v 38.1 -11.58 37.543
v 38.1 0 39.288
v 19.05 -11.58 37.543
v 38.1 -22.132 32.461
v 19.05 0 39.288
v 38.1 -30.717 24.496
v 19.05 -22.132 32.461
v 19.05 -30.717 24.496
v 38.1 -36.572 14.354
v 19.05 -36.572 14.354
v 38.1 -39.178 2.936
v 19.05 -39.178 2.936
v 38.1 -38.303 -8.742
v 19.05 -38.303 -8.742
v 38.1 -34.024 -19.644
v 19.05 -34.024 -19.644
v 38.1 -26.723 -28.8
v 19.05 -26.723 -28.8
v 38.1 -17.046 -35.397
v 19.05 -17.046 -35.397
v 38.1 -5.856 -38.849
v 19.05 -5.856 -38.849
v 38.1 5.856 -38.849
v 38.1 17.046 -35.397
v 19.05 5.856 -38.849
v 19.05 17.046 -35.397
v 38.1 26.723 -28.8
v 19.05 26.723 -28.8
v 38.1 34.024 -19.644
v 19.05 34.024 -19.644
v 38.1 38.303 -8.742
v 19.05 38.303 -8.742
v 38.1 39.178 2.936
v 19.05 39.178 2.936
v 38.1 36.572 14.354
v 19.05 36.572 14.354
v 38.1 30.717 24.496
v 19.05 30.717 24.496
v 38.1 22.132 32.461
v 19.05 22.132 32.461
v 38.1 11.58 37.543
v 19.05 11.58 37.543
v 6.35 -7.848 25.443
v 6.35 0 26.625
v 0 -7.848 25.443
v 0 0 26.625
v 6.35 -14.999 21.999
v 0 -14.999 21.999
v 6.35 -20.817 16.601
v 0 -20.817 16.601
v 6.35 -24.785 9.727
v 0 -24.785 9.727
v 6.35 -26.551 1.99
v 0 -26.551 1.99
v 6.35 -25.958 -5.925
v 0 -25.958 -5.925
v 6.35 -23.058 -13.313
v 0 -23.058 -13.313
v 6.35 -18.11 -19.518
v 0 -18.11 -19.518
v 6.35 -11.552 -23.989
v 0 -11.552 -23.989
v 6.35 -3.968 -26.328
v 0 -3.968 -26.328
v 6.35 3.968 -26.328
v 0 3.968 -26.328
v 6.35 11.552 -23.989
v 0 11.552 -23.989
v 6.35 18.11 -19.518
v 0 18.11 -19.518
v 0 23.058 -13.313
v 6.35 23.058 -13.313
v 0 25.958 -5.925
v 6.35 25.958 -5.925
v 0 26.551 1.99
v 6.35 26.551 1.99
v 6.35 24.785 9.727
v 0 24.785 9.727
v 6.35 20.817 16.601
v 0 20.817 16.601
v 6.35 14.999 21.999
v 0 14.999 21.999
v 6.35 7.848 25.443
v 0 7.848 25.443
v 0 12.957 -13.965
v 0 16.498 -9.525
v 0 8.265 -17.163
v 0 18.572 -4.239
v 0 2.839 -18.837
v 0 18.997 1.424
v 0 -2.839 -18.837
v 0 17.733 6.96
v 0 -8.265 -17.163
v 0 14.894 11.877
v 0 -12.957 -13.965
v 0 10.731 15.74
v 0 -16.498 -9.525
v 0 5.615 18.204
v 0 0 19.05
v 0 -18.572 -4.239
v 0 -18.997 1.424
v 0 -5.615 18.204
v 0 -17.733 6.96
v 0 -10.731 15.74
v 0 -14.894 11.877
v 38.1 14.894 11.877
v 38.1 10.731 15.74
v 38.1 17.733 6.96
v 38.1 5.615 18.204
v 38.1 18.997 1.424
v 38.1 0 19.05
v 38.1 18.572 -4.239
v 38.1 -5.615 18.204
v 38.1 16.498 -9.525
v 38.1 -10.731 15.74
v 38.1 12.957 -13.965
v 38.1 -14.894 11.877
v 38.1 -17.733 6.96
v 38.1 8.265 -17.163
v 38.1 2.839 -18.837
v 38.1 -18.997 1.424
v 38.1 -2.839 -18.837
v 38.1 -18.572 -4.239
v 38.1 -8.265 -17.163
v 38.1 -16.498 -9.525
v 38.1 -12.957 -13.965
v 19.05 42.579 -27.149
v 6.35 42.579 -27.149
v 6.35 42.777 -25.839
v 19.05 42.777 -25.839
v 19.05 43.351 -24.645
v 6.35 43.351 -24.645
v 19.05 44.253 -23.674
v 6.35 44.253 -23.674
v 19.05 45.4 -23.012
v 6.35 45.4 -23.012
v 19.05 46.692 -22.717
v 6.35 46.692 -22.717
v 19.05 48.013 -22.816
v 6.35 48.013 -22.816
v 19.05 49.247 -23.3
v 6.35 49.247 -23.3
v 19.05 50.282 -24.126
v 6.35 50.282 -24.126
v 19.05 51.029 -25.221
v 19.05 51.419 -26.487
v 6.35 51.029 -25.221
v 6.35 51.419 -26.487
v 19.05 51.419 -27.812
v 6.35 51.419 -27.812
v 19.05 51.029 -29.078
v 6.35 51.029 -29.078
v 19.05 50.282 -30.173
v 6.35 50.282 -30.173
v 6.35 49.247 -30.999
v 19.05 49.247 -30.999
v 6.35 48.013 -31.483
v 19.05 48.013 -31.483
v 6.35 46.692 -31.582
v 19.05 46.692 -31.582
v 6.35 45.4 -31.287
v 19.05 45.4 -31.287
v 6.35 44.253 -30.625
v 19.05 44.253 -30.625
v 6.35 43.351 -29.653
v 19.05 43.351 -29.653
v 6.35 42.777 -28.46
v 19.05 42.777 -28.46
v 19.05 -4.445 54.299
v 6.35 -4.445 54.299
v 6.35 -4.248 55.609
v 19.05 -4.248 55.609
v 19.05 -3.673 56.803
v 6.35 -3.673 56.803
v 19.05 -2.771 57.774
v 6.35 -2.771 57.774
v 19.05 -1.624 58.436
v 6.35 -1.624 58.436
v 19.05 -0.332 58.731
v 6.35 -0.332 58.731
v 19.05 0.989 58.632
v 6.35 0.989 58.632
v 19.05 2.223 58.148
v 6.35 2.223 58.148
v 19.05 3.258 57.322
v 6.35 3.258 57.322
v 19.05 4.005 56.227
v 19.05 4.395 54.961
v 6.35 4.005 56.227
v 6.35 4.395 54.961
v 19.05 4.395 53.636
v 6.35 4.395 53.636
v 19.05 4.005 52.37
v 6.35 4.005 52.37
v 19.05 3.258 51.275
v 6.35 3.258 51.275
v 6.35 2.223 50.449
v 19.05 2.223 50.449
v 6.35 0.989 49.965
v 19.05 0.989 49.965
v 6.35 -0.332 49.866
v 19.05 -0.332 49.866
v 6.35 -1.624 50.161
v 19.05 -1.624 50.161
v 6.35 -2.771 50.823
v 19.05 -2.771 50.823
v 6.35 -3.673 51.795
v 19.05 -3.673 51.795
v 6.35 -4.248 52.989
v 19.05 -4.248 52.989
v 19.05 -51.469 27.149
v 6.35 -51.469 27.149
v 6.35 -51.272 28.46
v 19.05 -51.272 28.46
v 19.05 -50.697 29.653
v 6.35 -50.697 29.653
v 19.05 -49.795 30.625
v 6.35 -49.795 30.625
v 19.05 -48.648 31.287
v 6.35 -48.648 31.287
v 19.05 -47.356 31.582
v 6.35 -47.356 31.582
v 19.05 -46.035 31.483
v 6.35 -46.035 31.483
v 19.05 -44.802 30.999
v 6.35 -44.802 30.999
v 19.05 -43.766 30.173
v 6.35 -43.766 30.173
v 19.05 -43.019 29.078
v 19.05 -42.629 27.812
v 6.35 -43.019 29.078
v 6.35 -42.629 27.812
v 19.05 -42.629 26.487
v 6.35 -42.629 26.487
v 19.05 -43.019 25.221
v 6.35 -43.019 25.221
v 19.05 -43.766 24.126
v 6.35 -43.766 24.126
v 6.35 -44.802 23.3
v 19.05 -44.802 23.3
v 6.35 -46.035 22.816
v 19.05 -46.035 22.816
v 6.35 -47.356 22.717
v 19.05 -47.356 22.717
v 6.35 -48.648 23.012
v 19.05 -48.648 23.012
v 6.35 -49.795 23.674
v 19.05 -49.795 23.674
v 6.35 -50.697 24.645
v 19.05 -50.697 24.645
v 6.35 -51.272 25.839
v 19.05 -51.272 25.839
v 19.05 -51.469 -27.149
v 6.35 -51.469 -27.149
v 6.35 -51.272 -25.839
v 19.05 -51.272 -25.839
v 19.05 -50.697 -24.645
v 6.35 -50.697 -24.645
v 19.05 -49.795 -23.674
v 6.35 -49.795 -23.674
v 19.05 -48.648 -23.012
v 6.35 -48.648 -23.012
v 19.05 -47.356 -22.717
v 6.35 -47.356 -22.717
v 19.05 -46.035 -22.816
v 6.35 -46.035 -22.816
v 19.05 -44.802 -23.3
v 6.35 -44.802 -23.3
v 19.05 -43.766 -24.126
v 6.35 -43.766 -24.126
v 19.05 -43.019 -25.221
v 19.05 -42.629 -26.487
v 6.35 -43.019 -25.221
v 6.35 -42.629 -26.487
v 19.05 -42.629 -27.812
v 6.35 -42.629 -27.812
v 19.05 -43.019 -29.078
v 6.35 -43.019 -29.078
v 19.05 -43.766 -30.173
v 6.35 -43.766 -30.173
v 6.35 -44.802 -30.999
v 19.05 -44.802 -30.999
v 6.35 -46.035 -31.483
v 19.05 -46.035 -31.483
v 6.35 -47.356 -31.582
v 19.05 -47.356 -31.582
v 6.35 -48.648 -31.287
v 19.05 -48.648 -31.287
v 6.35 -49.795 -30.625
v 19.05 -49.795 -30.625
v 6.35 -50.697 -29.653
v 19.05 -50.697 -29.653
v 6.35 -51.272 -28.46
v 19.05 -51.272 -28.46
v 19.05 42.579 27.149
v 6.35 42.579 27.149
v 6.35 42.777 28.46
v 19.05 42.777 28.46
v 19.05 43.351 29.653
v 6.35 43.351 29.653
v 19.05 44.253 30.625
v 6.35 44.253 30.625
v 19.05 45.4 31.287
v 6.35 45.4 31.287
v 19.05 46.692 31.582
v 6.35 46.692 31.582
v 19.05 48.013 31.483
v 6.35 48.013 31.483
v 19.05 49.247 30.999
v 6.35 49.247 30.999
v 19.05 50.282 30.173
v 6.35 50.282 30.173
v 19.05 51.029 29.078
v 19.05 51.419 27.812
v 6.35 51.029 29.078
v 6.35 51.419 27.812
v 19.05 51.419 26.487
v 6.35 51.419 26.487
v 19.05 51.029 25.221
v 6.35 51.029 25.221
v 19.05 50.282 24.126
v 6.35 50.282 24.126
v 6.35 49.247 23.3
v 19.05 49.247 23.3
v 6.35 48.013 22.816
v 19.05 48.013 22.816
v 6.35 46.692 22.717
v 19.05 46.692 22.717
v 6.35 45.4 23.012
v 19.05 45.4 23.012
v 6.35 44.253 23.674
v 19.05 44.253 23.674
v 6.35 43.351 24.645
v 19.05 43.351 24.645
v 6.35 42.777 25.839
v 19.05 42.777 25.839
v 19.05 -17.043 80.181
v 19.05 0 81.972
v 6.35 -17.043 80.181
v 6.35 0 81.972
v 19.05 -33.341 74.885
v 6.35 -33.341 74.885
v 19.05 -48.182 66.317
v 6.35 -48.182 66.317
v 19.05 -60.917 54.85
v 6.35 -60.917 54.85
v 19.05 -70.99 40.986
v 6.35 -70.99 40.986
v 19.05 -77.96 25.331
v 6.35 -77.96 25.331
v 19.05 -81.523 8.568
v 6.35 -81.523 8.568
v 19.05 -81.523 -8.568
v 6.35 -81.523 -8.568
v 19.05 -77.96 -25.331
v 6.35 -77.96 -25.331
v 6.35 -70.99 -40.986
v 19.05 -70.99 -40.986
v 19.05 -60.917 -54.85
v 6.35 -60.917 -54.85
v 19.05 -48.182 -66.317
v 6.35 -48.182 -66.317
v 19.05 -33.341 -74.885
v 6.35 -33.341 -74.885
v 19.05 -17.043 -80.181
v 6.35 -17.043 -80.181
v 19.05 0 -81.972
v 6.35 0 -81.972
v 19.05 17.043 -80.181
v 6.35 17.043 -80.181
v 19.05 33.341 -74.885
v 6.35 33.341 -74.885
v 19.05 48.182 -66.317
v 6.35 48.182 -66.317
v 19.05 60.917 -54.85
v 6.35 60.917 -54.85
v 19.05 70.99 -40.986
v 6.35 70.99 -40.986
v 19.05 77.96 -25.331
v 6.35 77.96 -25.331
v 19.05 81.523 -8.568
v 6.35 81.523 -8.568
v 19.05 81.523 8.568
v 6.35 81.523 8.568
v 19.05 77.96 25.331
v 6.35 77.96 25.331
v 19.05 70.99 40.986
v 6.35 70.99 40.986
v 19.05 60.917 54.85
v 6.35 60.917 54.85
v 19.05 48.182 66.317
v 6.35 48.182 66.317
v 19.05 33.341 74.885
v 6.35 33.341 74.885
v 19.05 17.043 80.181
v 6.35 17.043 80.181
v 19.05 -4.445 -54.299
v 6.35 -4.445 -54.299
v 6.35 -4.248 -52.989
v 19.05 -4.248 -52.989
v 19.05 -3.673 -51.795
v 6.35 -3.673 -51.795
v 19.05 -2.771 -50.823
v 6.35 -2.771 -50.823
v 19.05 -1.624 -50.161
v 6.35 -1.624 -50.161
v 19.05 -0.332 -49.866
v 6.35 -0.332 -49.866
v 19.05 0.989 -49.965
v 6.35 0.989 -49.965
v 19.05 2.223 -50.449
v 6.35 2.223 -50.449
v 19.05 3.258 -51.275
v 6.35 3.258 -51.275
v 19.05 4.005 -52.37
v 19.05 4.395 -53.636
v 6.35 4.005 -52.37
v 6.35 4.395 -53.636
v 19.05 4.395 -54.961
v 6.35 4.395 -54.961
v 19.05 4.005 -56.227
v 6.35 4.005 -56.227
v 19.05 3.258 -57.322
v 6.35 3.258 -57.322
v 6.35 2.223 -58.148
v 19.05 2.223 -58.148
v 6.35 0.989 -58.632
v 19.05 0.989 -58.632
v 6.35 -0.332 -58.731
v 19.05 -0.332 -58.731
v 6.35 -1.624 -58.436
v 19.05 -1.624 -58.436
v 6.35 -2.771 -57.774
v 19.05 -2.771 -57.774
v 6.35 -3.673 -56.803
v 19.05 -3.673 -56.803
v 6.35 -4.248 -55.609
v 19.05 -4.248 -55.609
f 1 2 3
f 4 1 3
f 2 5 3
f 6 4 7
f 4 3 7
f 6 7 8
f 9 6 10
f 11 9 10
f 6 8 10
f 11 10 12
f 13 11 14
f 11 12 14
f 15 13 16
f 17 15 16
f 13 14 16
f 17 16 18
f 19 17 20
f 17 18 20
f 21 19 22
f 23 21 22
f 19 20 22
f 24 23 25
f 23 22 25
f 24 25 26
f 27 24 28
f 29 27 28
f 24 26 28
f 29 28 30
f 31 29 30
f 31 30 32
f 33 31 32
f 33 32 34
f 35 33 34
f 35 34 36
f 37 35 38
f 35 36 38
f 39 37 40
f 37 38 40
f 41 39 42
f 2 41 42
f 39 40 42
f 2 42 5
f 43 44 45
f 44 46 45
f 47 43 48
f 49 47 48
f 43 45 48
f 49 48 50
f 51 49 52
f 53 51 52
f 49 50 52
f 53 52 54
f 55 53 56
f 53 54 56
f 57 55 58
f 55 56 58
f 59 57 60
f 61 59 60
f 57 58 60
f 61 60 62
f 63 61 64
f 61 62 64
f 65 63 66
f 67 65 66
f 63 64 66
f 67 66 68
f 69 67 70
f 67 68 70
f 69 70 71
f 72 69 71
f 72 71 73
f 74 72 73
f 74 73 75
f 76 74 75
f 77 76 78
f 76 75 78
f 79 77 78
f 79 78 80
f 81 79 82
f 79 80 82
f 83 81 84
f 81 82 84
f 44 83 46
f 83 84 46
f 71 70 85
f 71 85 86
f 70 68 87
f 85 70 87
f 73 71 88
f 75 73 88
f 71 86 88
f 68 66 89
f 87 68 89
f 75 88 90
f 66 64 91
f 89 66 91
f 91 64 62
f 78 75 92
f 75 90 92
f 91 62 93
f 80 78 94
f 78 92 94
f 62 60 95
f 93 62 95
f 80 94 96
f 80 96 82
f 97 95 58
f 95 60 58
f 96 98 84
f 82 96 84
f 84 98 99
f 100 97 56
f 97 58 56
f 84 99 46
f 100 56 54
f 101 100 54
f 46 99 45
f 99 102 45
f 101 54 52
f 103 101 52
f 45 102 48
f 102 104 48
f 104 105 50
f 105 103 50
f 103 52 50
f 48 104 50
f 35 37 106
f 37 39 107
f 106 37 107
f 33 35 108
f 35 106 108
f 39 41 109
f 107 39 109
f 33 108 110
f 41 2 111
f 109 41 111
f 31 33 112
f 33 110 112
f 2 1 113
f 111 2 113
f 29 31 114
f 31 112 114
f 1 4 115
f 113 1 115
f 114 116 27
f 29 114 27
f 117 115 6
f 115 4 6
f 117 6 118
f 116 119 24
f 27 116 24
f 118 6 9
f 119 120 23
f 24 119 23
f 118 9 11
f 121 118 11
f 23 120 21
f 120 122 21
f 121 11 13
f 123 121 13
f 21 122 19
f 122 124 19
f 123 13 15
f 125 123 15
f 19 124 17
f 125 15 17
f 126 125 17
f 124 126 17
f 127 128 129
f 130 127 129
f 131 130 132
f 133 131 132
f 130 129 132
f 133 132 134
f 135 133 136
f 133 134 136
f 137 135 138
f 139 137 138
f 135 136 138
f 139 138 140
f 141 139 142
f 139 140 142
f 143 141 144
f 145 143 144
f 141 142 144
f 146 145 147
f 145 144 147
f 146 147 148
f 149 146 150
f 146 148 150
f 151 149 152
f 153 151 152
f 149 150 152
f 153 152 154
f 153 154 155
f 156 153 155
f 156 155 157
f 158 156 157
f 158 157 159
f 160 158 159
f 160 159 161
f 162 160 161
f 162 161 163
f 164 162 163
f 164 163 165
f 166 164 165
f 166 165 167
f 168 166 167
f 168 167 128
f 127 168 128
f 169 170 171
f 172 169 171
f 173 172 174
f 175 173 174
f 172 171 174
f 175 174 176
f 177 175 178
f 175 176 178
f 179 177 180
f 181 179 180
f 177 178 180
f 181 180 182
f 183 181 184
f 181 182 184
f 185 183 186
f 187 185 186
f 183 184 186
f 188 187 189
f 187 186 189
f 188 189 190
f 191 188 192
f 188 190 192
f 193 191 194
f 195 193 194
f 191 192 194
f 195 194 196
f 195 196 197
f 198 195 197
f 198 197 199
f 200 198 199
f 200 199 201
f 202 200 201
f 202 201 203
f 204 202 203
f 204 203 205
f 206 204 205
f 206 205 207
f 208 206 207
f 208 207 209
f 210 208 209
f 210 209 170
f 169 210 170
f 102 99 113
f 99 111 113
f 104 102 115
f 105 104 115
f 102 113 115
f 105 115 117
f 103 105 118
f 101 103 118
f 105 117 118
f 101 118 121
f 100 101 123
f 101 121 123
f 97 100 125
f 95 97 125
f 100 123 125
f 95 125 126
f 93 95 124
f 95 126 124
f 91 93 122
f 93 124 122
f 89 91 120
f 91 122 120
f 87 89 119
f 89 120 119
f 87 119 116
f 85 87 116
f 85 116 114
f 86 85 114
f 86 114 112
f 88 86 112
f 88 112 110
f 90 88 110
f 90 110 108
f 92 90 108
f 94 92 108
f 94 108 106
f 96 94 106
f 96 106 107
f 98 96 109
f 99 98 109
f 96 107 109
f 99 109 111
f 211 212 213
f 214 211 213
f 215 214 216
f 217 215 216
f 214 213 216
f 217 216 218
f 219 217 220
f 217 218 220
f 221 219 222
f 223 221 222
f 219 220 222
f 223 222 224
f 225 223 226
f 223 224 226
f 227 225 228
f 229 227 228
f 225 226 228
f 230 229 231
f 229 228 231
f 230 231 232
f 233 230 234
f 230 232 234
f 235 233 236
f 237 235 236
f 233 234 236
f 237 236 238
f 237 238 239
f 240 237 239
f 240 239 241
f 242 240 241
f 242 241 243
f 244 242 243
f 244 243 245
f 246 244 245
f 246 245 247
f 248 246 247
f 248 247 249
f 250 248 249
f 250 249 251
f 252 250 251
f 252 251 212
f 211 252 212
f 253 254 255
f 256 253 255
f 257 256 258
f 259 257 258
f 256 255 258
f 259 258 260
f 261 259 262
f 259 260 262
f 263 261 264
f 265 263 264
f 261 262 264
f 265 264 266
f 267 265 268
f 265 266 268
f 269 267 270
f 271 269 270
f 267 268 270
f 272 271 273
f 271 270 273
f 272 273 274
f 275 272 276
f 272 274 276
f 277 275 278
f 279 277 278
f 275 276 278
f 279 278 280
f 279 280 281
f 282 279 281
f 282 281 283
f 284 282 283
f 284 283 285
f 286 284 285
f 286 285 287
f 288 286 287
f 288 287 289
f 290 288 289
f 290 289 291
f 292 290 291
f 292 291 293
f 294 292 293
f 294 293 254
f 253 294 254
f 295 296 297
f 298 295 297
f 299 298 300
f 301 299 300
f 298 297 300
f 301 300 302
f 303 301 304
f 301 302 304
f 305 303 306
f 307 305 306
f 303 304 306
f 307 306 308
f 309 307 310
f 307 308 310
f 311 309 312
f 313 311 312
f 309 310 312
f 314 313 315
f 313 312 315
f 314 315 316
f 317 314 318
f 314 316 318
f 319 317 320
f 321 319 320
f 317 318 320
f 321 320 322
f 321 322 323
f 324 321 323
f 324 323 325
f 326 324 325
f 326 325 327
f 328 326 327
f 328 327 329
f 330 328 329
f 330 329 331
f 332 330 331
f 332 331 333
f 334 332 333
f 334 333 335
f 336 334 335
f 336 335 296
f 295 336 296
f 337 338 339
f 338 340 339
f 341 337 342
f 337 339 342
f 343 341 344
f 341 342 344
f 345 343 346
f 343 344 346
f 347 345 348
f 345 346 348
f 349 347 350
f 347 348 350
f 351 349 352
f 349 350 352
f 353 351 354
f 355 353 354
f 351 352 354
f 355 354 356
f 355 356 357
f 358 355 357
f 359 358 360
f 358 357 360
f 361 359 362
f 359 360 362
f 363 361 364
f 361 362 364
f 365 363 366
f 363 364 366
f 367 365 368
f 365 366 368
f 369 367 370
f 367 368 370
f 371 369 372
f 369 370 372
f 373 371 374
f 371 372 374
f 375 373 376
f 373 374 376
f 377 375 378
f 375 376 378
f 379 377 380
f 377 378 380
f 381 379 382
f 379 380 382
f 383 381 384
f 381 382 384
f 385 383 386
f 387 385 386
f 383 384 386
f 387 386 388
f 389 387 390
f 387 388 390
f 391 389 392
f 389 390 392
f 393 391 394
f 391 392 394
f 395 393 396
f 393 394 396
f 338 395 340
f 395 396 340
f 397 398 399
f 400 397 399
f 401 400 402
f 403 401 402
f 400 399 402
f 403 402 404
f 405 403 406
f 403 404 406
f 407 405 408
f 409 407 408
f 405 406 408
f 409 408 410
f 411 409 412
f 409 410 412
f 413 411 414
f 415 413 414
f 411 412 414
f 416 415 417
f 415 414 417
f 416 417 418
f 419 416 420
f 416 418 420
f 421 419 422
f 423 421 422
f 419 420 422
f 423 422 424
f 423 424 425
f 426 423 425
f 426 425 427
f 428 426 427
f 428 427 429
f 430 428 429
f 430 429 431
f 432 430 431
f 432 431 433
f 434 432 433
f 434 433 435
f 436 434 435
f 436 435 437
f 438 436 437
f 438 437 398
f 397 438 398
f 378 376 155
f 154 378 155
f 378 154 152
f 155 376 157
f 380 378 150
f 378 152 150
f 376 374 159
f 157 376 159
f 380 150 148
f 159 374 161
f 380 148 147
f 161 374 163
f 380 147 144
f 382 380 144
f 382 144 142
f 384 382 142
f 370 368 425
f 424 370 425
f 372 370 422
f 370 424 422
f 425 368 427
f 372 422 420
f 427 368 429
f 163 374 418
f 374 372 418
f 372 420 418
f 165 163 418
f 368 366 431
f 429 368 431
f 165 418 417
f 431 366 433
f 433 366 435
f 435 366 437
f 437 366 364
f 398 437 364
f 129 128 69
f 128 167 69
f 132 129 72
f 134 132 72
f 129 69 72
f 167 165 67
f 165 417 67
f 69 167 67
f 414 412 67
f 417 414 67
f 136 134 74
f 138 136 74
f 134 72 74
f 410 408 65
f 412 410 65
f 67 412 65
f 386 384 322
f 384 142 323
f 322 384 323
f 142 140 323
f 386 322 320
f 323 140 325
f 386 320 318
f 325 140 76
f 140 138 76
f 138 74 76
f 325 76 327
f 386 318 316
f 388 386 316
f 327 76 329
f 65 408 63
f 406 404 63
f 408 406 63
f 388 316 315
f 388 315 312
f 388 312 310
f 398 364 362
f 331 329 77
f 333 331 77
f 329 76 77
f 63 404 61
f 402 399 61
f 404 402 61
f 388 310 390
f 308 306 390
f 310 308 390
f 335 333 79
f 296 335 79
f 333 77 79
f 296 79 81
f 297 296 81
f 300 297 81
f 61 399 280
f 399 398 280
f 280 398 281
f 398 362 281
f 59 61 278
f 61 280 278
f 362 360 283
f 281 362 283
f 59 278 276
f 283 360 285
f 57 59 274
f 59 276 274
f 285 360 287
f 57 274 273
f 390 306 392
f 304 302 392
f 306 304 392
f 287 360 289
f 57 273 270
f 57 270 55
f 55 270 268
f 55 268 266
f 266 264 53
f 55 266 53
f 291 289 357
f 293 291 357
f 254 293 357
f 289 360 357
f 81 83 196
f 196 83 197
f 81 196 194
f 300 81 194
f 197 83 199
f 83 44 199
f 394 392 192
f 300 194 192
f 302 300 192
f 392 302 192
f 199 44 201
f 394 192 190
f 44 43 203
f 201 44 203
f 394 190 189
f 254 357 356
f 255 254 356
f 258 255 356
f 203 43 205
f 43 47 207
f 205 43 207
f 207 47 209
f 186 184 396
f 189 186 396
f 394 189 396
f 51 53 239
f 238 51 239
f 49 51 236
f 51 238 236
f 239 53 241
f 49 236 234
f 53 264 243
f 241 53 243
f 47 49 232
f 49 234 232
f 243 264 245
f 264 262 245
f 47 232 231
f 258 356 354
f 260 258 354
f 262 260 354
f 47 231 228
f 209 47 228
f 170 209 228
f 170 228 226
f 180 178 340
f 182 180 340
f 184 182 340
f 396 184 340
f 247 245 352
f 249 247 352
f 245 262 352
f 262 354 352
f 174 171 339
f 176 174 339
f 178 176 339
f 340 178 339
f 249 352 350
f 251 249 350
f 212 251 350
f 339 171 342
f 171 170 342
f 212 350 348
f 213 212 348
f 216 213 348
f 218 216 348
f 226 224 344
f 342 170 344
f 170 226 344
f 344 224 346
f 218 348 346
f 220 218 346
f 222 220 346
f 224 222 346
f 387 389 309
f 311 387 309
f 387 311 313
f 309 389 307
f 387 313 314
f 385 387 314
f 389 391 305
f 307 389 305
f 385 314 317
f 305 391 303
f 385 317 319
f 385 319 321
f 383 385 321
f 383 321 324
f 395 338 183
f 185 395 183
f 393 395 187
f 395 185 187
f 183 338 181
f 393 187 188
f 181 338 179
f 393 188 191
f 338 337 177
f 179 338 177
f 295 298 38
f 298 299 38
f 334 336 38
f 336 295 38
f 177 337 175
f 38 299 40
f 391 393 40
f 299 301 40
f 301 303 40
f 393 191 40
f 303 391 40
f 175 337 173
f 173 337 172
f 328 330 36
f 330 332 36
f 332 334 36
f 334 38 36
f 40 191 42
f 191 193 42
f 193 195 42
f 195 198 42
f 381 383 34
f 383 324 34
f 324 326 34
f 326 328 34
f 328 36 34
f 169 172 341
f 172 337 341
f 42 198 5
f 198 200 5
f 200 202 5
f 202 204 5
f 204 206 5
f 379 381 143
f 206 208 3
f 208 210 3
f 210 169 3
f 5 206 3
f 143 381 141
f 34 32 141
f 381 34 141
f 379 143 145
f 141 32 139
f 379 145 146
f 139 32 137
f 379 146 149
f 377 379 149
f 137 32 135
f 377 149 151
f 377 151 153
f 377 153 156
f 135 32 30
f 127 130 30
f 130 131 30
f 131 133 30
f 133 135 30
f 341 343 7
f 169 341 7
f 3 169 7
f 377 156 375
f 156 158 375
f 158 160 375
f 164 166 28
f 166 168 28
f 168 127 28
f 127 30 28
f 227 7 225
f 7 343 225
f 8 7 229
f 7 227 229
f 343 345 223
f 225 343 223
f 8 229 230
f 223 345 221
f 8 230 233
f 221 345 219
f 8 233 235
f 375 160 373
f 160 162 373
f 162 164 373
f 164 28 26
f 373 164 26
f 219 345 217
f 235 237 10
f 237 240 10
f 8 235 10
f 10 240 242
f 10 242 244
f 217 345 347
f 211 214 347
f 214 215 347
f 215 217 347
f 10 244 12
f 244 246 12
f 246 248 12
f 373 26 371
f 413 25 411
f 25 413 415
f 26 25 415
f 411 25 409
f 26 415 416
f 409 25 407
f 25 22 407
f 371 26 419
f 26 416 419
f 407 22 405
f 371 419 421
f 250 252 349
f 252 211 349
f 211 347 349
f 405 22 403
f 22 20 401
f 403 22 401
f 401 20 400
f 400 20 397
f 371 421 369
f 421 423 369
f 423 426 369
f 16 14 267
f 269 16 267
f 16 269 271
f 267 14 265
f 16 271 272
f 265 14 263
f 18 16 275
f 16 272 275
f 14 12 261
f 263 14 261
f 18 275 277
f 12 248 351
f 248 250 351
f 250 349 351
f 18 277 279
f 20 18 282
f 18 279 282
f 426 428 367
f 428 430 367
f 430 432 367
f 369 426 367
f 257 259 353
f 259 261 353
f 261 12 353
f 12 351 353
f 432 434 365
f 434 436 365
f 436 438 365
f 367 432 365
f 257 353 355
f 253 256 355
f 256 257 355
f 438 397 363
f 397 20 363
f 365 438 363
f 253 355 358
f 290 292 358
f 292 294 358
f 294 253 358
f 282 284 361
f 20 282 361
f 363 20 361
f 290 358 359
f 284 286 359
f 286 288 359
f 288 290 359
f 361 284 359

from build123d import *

# Parameters (mm, degrees)
F3_R     = 4.445
F4_DEPTH = 31.751


with BuildPart() as f1:
    # F0 (on Front) → F1 (revolve)
    with BuildSketch(Plane.XZ):
        Polygon((0, 26.6254378243), (0, 19.05), (38.1, 19.05), (38.1, 39.2880663276), (19.05, 39.2880663276), (19.05, 81.9719955325), (6.35, 81.9719955325), (6.35, 26.6254378243), align=None)
    revolve(axis=Axis((2.4508777199, 0, 0), (1, 0, 0)))

    # F3 (on offset) → F4 (cut, through all)
    with BuildSketch(Plane(origin=(6.35, 0, 0), x_dir=(0, -1, 0), z_dir=(-1, 0, 0))):
        with Locations((0, 54.2987166784)):
            Circle(F3_R)
        with Locations((-47.0240680364, 27.1493583392)):
            Circle(F3_R)
        with Locations((-47.0240680364, -27.1493583392)):
            Circle(F3_R)
        with Locations((0, -54.2987166784)):
            Circle(F3_R)
        with Locations((47.0240680364, -27.1493583392)):
            Circle(F3_R)
        with Locations((47.0240680364, 27.1493583392)):
            Circle(F3_R)
    extrude(amount=-F4_DEPTH, mode=Mode.SUBTRACT)


solid = f1.part
